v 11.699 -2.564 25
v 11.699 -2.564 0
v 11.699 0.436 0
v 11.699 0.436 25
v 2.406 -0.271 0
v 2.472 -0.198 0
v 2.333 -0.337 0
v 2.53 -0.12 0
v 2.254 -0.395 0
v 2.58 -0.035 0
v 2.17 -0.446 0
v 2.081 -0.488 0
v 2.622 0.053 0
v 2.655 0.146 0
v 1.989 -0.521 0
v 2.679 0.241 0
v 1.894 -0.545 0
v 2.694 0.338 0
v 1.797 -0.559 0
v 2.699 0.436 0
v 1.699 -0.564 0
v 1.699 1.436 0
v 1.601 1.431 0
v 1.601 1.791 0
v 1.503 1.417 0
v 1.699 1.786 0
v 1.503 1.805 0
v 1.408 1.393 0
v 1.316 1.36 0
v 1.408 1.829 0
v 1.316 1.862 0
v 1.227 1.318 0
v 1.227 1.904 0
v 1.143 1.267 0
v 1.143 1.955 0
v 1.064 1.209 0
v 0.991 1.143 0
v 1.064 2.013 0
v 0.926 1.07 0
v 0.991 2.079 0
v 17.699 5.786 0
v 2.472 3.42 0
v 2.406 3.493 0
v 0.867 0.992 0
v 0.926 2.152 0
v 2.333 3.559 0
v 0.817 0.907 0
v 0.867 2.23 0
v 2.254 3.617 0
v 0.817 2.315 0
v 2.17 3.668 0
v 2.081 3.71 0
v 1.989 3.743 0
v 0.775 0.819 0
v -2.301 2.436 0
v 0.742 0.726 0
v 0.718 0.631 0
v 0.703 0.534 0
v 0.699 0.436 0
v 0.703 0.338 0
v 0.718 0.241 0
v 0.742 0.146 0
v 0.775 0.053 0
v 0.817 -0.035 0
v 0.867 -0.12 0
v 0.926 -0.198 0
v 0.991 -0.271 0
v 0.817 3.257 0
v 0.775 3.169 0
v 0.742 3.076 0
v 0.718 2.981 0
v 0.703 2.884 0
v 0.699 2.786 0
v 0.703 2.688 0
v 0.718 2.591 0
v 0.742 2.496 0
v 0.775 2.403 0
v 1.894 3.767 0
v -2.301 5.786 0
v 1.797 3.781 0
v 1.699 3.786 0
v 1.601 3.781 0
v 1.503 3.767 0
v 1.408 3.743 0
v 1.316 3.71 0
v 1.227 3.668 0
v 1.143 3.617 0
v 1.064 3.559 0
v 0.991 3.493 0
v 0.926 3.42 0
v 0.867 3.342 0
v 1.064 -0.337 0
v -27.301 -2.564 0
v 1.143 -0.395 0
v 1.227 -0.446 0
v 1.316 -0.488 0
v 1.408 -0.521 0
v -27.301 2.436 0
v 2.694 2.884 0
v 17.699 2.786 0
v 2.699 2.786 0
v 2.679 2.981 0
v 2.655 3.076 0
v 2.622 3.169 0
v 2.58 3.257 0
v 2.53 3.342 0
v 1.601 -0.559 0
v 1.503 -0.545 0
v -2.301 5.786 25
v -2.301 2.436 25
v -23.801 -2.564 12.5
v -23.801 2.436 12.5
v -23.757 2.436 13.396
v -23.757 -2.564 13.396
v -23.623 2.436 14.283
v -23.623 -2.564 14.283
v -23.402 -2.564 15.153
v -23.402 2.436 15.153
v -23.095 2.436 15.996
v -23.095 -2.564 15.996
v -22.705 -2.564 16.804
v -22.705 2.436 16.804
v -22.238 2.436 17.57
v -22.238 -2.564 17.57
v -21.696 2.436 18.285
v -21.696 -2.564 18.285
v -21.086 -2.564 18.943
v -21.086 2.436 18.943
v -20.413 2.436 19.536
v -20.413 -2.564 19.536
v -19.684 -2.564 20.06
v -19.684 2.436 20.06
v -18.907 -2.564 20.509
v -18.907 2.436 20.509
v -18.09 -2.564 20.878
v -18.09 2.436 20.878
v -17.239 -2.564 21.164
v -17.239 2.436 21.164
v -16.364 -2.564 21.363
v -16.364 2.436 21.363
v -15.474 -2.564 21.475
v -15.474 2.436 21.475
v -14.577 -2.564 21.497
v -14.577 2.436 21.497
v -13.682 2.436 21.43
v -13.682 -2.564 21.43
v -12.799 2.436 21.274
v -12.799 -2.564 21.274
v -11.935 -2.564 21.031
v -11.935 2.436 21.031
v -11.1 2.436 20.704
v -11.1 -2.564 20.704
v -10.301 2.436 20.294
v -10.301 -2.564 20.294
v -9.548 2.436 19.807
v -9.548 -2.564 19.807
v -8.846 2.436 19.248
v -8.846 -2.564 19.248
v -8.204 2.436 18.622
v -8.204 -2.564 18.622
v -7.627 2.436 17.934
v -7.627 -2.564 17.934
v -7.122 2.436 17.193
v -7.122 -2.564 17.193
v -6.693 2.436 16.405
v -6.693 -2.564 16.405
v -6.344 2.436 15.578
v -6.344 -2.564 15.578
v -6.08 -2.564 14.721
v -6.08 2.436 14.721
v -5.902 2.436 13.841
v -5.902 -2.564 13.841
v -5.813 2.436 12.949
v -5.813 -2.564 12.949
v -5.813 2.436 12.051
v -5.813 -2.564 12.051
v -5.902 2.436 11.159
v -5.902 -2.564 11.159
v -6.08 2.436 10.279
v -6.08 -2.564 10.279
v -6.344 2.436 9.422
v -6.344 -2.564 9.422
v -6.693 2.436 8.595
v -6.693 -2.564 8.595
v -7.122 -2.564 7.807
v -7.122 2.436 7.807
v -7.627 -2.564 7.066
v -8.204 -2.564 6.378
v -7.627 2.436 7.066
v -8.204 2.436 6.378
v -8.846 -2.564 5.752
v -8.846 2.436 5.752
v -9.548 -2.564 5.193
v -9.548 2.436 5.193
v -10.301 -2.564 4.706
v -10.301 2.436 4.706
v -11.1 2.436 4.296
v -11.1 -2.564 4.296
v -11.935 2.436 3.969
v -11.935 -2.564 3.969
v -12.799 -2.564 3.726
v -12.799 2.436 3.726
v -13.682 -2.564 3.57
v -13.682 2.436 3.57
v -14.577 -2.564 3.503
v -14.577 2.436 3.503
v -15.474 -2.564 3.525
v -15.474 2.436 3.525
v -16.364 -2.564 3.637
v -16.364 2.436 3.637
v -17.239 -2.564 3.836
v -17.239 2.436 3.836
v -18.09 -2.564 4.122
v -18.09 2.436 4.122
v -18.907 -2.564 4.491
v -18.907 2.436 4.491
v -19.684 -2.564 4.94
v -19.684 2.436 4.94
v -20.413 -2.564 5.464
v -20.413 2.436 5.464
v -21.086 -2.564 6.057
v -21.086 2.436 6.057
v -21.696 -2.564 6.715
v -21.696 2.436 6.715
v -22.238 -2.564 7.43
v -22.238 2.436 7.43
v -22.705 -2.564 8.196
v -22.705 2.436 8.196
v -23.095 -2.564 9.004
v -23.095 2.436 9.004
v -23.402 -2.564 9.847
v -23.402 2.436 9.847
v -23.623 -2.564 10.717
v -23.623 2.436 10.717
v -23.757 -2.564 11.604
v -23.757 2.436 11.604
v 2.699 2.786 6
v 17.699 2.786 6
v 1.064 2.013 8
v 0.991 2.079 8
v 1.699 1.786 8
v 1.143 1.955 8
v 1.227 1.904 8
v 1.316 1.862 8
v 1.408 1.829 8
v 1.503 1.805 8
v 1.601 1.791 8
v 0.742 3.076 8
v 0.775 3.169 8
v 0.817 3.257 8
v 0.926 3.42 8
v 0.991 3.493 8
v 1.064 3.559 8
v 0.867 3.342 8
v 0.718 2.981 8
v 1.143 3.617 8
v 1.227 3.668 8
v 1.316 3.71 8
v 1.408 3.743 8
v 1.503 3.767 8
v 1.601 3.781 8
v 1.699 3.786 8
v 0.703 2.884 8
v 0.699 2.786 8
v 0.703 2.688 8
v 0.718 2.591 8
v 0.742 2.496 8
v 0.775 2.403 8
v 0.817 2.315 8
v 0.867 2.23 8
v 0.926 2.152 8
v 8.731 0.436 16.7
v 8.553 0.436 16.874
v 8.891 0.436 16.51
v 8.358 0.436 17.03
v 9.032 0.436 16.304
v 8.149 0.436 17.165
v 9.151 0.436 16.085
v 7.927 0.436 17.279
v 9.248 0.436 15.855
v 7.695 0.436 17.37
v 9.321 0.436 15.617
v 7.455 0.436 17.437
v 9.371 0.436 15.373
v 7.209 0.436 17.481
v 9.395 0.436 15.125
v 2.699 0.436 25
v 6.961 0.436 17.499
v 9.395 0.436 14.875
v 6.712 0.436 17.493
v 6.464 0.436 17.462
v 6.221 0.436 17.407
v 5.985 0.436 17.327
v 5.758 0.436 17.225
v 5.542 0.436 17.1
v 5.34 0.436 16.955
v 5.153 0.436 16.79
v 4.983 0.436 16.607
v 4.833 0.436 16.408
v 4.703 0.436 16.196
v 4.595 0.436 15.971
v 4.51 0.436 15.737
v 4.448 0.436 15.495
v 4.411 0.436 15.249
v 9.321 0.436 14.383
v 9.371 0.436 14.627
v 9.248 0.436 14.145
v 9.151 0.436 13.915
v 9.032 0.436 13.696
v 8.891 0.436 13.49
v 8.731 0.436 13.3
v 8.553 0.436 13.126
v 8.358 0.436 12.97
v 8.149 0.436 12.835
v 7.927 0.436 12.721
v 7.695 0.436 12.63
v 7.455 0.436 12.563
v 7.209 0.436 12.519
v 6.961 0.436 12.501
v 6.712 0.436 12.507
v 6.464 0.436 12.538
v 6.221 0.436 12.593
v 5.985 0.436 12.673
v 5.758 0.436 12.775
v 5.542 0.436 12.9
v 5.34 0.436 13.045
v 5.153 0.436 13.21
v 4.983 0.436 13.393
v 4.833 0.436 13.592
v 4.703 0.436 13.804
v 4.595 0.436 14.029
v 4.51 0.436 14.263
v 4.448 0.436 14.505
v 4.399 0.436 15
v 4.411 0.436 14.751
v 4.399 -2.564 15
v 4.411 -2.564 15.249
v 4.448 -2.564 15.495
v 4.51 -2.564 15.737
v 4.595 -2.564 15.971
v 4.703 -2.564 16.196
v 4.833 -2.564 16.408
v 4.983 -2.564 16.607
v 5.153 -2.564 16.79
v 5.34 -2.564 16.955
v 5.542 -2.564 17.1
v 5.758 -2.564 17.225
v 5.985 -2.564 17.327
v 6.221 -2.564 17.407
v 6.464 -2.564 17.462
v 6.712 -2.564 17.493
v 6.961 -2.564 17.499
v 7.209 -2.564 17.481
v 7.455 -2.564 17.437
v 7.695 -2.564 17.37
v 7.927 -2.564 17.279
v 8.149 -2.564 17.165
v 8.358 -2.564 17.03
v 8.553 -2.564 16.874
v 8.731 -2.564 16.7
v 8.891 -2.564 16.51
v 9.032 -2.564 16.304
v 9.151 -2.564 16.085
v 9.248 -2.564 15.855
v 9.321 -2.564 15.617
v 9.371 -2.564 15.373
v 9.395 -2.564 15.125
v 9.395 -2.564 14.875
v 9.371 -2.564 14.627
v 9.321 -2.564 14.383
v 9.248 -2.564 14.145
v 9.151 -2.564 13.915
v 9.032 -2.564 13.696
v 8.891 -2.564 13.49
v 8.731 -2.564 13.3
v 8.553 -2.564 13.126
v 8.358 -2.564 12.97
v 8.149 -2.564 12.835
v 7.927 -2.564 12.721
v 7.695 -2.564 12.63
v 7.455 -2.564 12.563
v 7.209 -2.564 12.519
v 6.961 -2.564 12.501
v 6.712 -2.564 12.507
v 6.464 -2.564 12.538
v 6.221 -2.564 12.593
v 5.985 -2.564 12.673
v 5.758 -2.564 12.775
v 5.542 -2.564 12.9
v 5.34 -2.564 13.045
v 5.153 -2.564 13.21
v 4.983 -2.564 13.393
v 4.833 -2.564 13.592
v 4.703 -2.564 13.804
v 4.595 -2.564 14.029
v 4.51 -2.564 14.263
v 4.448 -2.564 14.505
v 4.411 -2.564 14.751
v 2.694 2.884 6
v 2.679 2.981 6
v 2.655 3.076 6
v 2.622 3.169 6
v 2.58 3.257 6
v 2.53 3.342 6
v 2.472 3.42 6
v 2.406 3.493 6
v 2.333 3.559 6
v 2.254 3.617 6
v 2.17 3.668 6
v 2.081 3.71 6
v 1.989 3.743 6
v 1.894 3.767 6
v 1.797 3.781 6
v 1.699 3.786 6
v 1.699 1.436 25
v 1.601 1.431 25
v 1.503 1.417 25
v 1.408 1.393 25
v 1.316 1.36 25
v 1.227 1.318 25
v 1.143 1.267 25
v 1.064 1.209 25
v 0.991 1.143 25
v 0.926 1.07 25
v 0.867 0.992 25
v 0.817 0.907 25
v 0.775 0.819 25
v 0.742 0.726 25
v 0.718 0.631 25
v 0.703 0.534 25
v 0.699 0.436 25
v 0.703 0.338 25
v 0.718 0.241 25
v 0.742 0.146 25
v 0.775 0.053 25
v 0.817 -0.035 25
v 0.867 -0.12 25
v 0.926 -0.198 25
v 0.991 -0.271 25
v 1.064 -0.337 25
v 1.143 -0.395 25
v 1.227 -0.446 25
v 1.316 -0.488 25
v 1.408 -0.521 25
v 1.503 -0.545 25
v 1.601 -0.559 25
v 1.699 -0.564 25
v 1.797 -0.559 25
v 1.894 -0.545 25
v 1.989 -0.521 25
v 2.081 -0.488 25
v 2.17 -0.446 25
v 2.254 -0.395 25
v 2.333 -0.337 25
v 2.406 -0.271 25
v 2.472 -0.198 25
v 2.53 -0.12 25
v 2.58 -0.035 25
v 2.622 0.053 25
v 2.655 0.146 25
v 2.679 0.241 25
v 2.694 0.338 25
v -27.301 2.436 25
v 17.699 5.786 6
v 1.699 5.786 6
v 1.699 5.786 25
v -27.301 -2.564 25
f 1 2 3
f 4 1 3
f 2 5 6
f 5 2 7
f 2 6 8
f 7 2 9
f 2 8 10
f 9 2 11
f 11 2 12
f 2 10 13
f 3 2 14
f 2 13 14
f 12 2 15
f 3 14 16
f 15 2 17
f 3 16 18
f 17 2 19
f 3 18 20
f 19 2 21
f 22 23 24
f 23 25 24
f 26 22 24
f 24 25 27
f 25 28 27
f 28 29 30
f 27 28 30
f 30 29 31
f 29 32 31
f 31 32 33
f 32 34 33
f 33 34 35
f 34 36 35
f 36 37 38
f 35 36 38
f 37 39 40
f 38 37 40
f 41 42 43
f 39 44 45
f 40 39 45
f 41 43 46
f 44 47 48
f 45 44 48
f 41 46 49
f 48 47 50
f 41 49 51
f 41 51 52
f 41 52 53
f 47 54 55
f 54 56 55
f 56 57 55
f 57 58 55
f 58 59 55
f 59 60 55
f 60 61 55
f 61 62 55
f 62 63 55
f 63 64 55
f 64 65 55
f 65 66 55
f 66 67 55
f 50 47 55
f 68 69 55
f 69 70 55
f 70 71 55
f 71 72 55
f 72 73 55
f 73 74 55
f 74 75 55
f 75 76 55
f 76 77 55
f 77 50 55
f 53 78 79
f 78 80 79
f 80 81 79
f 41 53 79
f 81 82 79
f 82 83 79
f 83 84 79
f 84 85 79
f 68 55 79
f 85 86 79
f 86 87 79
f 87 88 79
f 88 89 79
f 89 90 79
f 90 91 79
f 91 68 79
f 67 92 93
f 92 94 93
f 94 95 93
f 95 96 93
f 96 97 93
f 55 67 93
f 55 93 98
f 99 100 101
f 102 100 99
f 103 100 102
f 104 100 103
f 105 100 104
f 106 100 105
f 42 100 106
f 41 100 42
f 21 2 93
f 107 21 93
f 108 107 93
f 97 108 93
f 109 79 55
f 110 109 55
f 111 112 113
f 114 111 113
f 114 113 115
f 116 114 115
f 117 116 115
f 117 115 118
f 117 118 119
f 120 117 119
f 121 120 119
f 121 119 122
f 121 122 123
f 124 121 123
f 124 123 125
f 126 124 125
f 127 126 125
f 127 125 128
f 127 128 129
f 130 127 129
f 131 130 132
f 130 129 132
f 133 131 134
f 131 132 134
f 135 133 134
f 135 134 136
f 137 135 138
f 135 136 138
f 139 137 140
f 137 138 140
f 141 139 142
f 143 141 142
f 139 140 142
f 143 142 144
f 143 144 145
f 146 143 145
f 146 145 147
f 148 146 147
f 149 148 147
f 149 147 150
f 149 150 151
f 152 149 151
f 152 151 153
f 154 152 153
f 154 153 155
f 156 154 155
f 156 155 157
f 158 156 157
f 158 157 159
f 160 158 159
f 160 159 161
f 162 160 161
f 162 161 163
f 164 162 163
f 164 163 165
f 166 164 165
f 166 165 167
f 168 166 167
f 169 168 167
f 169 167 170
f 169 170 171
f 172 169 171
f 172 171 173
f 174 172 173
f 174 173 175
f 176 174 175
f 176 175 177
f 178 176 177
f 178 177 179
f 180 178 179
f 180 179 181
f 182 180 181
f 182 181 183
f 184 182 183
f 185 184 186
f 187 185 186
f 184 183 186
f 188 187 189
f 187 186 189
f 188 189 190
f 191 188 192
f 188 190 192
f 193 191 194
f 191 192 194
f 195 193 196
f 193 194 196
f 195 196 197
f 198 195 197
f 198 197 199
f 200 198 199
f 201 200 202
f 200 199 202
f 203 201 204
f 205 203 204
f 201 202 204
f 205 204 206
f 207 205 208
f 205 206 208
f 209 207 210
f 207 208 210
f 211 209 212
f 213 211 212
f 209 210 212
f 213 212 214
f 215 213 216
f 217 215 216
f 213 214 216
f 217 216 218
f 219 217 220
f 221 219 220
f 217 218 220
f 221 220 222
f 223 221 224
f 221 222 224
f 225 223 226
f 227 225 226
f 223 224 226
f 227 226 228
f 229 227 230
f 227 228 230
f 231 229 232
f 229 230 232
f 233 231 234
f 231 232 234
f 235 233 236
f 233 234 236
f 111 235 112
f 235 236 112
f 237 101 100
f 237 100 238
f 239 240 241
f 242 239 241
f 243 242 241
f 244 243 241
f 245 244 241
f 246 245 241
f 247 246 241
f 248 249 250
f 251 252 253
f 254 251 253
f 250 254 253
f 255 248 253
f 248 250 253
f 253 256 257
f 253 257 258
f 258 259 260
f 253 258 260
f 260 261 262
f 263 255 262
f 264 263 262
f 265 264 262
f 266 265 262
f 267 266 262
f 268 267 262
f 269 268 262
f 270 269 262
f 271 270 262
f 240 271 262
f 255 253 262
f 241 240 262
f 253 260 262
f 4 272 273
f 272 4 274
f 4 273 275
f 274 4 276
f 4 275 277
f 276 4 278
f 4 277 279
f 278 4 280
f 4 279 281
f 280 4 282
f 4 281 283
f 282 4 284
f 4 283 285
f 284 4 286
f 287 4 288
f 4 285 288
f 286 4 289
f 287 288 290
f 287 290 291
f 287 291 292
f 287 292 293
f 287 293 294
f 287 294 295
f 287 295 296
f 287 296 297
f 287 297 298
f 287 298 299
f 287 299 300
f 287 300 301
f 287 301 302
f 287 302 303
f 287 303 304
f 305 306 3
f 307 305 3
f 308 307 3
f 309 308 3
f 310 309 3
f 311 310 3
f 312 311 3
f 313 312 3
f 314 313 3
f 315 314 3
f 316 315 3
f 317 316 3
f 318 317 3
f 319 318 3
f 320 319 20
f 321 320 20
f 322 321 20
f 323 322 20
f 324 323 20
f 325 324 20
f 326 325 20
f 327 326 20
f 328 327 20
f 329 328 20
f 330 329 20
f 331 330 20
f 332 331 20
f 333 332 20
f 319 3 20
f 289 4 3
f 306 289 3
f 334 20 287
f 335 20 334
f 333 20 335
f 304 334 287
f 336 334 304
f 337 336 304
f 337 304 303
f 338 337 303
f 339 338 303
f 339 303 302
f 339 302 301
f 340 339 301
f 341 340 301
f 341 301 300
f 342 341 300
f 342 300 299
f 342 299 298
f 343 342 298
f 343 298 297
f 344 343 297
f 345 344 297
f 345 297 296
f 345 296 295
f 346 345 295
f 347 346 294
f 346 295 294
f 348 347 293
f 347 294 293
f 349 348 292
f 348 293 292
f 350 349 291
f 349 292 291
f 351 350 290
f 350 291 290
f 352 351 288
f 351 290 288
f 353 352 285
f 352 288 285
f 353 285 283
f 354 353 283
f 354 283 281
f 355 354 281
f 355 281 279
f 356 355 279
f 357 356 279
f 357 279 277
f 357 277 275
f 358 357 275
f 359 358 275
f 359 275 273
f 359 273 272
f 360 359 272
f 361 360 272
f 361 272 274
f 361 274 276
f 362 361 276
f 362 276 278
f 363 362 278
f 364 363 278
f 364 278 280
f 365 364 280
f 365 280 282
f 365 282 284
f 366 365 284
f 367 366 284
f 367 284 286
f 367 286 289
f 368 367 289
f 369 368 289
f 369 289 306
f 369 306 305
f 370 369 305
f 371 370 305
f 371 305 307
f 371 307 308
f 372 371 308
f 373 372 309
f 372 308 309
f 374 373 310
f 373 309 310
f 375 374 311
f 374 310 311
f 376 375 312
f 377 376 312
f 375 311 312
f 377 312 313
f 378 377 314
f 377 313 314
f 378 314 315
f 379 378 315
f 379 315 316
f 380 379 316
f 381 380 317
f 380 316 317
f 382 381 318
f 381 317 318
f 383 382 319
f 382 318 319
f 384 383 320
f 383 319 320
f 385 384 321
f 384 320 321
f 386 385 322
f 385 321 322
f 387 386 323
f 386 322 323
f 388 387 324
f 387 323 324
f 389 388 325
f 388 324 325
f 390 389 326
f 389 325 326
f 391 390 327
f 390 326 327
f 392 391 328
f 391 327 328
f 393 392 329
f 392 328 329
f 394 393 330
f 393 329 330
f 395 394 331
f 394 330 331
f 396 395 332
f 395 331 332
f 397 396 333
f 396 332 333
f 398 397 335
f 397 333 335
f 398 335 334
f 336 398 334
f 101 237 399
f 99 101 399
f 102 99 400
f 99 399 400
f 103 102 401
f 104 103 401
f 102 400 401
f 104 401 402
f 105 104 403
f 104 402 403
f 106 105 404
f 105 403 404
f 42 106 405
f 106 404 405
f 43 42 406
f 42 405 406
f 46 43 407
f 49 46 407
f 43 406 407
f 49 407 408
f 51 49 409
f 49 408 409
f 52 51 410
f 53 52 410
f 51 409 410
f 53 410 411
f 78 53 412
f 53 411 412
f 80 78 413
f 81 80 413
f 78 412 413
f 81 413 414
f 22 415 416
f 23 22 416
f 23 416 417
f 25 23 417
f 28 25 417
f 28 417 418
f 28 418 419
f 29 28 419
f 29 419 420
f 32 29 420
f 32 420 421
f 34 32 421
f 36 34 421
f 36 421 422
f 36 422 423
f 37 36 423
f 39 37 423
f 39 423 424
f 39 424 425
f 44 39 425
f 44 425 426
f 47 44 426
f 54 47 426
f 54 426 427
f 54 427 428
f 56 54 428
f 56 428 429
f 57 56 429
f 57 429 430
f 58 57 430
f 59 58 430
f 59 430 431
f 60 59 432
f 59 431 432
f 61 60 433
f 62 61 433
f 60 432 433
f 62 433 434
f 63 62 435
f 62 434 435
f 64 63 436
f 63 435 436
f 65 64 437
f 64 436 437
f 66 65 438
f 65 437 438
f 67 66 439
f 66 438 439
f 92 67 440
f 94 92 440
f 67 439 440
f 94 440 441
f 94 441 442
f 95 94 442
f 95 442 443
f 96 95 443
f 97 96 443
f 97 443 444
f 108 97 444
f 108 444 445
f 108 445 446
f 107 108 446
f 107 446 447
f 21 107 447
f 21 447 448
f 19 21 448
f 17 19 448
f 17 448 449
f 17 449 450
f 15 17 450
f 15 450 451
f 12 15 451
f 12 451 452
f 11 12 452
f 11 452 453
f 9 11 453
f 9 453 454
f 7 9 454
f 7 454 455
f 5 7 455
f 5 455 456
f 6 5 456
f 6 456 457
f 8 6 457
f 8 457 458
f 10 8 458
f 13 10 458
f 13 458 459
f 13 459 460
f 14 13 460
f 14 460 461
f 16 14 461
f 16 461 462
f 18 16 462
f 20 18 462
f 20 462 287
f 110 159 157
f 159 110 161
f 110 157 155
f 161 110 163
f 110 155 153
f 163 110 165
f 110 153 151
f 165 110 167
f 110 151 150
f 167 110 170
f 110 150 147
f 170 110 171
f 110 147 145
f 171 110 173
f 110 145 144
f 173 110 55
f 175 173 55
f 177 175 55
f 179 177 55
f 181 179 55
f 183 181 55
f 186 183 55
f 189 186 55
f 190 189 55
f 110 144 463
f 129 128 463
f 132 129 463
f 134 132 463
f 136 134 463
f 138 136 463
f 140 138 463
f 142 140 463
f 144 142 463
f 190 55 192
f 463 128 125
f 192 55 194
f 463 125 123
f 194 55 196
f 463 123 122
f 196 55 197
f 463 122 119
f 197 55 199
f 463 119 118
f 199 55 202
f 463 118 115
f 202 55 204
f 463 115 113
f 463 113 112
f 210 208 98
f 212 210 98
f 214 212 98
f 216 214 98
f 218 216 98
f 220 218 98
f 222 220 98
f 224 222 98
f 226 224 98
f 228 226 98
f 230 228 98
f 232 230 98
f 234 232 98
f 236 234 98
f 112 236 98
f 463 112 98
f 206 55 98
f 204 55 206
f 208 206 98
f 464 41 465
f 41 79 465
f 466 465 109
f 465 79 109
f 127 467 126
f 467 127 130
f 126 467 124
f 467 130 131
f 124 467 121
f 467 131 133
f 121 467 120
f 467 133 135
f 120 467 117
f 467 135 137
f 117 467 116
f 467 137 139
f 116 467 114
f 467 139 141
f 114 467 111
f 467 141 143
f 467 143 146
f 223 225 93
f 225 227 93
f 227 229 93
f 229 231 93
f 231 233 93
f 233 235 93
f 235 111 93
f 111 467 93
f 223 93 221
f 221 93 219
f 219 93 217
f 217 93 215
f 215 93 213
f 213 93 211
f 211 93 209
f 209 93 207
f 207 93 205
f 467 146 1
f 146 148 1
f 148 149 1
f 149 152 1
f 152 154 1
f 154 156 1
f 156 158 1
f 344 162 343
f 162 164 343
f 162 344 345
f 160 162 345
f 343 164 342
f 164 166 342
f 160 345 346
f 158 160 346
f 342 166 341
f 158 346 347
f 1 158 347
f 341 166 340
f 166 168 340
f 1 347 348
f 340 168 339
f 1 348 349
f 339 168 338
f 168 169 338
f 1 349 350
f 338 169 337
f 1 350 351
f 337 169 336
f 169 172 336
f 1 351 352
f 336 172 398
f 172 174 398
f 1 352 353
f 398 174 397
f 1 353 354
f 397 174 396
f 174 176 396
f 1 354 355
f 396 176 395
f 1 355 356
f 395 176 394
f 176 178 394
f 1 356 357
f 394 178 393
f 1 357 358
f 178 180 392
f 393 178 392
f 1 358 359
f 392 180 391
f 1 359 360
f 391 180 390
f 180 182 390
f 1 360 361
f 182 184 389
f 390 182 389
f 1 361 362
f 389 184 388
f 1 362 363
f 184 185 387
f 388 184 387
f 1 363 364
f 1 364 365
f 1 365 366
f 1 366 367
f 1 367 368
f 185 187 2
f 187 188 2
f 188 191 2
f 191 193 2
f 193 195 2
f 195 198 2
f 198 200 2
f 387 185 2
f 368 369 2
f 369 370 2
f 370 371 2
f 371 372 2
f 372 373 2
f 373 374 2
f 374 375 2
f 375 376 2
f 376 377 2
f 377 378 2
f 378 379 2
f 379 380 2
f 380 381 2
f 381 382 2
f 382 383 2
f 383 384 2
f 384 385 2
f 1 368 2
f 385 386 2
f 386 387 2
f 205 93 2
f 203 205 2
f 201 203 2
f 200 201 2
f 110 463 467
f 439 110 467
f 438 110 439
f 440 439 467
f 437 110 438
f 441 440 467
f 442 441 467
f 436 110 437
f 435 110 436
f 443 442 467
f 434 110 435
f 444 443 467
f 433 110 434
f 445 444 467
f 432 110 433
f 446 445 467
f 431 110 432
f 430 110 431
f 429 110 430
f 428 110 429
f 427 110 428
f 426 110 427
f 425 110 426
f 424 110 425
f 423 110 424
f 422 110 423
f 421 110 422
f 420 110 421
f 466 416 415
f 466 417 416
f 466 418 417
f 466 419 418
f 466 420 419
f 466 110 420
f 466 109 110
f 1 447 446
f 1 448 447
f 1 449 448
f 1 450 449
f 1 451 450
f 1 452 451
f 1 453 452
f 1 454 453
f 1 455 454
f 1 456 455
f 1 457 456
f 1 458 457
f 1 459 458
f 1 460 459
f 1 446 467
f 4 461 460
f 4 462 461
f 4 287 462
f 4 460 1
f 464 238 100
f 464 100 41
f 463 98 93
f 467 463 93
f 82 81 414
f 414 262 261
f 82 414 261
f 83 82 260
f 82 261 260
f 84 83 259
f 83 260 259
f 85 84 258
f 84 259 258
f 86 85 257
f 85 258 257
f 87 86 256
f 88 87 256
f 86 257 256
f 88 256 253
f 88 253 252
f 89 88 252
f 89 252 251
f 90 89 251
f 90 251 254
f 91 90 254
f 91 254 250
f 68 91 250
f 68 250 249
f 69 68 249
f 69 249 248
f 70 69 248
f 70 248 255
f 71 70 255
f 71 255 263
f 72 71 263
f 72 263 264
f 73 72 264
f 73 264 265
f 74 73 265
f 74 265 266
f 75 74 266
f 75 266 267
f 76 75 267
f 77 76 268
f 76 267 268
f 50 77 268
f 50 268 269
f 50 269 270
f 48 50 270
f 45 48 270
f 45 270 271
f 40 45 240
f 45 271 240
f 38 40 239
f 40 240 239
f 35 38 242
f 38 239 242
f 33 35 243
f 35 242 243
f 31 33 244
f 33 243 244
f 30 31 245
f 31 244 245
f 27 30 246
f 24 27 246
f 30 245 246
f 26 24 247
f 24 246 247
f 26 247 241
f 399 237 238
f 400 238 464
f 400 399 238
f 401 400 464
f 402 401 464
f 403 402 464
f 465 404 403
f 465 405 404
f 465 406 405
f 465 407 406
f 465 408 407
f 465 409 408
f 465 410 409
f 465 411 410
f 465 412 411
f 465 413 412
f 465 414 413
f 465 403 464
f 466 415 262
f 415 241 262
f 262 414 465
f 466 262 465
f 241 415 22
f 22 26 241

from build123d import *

# Parameters (mm, degrees)
F1_DEPTH       = 25
F2_W           = 10
F2_H           = 19
F3_DEPTH       = 3
F4_R           = 9
F5_DEPTH       = 10
F6_R           = 2.5
F7_DEPTH       = 25
F8_W           = 3
F8_H           = 6
F9_DEPTH       = 6
F10_R          = 1
F11_DEPTH      = 25
F13_DEPTH      = 25
F13_DEPTH_BACK = 2


with BuildPart() as f1:
    # F0 (on Top) → F1 (new body)
    with BuildSketch(Plane.XY):
        Polygon((1.6985263115, 0.4360290599), (1.6985263115, 2.7860290599), (11.6985263115, 2.7860290599), (11.6985263115, 5.7860290599), (-2.3014736885, 5.7860290599), (-2.3014736885, 2.4360290599), (-27.3014736885, 2.4360290599), (-27.3014736885, -2.5639709401), (11.6985263115, -2.5639709401), (11.6985263115, 0.4360290599), align=None)
    extrude(amount=F1_DEPTH)

    # F2 (on face) → F3 (cut)
    with BuildSketch(Plane(origin=(0, 5.7860290599, 0), x_dir=(-1, 0, 0), z_dir=(0, 1, 0))):
        with Locations((-6.6985263115, 15.5)):
            Rectangle(F2_W, F2_H)
    extrude(amount=-F3_DEPTH, mode=Mode.SUBTRACT)

    # F4 (on face) → F5 (cut)
    with BuildSketch(Plane(origin=(0, 2.4360290599, 0), x_dir=(-1, 0, 0), z_dir=(0, 1, 0))):
        with Locations((14.8014736885, 12.5)):
            Circle(F4_R)
    extrude(amount=-F5_DEPTH, mode=Mode.SUBTRACT)

    # F6 (on face) → F7 (cut)
    with BuildSketch(Plane(origin=(0, 0.4360290599, 0), x_dir=(-1, 0, 0), z_dir=(0, 1, 0))):
        with Locations((-6.8985263115, 15)):
            Circle(F6_R)
    extrude(amount=-F7_DEPTH, mode=Mode.SUBTRACT)

    # F8 (on face) → F9 (join)
    with BuildSketch(Plane.YZ.offset(11.6985263115)):
        with Locations((4.2860290599, 3)):
            Rectangle(F8_W, F8_H)
    extrude(amount=F9_DEPTH)

    # F10 (on face) → F11 (cut)
    with BuildSketch(Plane.XY.offset(25)):
        with Locations((1.6985263115, 0.4360290599)):
            Circle(F10_R)
    extrude(amount=-F11_DEPTH, mode=Mode.SUBTRACT)

    # F12 (on face) → F13 (cut, two sides)
    with BuildSketch(Plane.XY.offset(6)) as f13_sk:
        with BuildLine():
            ThreePointArc((1.6985263115, 3.7860290599), (0.9914195303, 2.0789222787), (2.6985263115, 2.7860290599))
            Line((2.6985263115, 2.7860290599), (1.6985263115, 2.7860290599))
            Line((1.6985263115, 2.7860290599), (1.6985263115, 3.7860290599))
        make_face()
        with BuildLine():
            Line((1.6985263115, 2.7860290599), (2.6985263115, 2.7860290599))
            ThreePointArc((2.6985263115, 2.7860290599), (2.4056330927, 3.4931358411), (1.6985263115, 3.7860290599))
            Line((1.6985263115, 3.7860290599), (1.6985263115, 2.7860290599))
        make_face()
    extrude(amount=-F13_DEPTH, mode=Mode.SUBTRACT)
    extrude(f13_sk.sketch, amount=F13_DEPTH_BACK, mode=Mode.SUBTRACT)


solid = f1.part
